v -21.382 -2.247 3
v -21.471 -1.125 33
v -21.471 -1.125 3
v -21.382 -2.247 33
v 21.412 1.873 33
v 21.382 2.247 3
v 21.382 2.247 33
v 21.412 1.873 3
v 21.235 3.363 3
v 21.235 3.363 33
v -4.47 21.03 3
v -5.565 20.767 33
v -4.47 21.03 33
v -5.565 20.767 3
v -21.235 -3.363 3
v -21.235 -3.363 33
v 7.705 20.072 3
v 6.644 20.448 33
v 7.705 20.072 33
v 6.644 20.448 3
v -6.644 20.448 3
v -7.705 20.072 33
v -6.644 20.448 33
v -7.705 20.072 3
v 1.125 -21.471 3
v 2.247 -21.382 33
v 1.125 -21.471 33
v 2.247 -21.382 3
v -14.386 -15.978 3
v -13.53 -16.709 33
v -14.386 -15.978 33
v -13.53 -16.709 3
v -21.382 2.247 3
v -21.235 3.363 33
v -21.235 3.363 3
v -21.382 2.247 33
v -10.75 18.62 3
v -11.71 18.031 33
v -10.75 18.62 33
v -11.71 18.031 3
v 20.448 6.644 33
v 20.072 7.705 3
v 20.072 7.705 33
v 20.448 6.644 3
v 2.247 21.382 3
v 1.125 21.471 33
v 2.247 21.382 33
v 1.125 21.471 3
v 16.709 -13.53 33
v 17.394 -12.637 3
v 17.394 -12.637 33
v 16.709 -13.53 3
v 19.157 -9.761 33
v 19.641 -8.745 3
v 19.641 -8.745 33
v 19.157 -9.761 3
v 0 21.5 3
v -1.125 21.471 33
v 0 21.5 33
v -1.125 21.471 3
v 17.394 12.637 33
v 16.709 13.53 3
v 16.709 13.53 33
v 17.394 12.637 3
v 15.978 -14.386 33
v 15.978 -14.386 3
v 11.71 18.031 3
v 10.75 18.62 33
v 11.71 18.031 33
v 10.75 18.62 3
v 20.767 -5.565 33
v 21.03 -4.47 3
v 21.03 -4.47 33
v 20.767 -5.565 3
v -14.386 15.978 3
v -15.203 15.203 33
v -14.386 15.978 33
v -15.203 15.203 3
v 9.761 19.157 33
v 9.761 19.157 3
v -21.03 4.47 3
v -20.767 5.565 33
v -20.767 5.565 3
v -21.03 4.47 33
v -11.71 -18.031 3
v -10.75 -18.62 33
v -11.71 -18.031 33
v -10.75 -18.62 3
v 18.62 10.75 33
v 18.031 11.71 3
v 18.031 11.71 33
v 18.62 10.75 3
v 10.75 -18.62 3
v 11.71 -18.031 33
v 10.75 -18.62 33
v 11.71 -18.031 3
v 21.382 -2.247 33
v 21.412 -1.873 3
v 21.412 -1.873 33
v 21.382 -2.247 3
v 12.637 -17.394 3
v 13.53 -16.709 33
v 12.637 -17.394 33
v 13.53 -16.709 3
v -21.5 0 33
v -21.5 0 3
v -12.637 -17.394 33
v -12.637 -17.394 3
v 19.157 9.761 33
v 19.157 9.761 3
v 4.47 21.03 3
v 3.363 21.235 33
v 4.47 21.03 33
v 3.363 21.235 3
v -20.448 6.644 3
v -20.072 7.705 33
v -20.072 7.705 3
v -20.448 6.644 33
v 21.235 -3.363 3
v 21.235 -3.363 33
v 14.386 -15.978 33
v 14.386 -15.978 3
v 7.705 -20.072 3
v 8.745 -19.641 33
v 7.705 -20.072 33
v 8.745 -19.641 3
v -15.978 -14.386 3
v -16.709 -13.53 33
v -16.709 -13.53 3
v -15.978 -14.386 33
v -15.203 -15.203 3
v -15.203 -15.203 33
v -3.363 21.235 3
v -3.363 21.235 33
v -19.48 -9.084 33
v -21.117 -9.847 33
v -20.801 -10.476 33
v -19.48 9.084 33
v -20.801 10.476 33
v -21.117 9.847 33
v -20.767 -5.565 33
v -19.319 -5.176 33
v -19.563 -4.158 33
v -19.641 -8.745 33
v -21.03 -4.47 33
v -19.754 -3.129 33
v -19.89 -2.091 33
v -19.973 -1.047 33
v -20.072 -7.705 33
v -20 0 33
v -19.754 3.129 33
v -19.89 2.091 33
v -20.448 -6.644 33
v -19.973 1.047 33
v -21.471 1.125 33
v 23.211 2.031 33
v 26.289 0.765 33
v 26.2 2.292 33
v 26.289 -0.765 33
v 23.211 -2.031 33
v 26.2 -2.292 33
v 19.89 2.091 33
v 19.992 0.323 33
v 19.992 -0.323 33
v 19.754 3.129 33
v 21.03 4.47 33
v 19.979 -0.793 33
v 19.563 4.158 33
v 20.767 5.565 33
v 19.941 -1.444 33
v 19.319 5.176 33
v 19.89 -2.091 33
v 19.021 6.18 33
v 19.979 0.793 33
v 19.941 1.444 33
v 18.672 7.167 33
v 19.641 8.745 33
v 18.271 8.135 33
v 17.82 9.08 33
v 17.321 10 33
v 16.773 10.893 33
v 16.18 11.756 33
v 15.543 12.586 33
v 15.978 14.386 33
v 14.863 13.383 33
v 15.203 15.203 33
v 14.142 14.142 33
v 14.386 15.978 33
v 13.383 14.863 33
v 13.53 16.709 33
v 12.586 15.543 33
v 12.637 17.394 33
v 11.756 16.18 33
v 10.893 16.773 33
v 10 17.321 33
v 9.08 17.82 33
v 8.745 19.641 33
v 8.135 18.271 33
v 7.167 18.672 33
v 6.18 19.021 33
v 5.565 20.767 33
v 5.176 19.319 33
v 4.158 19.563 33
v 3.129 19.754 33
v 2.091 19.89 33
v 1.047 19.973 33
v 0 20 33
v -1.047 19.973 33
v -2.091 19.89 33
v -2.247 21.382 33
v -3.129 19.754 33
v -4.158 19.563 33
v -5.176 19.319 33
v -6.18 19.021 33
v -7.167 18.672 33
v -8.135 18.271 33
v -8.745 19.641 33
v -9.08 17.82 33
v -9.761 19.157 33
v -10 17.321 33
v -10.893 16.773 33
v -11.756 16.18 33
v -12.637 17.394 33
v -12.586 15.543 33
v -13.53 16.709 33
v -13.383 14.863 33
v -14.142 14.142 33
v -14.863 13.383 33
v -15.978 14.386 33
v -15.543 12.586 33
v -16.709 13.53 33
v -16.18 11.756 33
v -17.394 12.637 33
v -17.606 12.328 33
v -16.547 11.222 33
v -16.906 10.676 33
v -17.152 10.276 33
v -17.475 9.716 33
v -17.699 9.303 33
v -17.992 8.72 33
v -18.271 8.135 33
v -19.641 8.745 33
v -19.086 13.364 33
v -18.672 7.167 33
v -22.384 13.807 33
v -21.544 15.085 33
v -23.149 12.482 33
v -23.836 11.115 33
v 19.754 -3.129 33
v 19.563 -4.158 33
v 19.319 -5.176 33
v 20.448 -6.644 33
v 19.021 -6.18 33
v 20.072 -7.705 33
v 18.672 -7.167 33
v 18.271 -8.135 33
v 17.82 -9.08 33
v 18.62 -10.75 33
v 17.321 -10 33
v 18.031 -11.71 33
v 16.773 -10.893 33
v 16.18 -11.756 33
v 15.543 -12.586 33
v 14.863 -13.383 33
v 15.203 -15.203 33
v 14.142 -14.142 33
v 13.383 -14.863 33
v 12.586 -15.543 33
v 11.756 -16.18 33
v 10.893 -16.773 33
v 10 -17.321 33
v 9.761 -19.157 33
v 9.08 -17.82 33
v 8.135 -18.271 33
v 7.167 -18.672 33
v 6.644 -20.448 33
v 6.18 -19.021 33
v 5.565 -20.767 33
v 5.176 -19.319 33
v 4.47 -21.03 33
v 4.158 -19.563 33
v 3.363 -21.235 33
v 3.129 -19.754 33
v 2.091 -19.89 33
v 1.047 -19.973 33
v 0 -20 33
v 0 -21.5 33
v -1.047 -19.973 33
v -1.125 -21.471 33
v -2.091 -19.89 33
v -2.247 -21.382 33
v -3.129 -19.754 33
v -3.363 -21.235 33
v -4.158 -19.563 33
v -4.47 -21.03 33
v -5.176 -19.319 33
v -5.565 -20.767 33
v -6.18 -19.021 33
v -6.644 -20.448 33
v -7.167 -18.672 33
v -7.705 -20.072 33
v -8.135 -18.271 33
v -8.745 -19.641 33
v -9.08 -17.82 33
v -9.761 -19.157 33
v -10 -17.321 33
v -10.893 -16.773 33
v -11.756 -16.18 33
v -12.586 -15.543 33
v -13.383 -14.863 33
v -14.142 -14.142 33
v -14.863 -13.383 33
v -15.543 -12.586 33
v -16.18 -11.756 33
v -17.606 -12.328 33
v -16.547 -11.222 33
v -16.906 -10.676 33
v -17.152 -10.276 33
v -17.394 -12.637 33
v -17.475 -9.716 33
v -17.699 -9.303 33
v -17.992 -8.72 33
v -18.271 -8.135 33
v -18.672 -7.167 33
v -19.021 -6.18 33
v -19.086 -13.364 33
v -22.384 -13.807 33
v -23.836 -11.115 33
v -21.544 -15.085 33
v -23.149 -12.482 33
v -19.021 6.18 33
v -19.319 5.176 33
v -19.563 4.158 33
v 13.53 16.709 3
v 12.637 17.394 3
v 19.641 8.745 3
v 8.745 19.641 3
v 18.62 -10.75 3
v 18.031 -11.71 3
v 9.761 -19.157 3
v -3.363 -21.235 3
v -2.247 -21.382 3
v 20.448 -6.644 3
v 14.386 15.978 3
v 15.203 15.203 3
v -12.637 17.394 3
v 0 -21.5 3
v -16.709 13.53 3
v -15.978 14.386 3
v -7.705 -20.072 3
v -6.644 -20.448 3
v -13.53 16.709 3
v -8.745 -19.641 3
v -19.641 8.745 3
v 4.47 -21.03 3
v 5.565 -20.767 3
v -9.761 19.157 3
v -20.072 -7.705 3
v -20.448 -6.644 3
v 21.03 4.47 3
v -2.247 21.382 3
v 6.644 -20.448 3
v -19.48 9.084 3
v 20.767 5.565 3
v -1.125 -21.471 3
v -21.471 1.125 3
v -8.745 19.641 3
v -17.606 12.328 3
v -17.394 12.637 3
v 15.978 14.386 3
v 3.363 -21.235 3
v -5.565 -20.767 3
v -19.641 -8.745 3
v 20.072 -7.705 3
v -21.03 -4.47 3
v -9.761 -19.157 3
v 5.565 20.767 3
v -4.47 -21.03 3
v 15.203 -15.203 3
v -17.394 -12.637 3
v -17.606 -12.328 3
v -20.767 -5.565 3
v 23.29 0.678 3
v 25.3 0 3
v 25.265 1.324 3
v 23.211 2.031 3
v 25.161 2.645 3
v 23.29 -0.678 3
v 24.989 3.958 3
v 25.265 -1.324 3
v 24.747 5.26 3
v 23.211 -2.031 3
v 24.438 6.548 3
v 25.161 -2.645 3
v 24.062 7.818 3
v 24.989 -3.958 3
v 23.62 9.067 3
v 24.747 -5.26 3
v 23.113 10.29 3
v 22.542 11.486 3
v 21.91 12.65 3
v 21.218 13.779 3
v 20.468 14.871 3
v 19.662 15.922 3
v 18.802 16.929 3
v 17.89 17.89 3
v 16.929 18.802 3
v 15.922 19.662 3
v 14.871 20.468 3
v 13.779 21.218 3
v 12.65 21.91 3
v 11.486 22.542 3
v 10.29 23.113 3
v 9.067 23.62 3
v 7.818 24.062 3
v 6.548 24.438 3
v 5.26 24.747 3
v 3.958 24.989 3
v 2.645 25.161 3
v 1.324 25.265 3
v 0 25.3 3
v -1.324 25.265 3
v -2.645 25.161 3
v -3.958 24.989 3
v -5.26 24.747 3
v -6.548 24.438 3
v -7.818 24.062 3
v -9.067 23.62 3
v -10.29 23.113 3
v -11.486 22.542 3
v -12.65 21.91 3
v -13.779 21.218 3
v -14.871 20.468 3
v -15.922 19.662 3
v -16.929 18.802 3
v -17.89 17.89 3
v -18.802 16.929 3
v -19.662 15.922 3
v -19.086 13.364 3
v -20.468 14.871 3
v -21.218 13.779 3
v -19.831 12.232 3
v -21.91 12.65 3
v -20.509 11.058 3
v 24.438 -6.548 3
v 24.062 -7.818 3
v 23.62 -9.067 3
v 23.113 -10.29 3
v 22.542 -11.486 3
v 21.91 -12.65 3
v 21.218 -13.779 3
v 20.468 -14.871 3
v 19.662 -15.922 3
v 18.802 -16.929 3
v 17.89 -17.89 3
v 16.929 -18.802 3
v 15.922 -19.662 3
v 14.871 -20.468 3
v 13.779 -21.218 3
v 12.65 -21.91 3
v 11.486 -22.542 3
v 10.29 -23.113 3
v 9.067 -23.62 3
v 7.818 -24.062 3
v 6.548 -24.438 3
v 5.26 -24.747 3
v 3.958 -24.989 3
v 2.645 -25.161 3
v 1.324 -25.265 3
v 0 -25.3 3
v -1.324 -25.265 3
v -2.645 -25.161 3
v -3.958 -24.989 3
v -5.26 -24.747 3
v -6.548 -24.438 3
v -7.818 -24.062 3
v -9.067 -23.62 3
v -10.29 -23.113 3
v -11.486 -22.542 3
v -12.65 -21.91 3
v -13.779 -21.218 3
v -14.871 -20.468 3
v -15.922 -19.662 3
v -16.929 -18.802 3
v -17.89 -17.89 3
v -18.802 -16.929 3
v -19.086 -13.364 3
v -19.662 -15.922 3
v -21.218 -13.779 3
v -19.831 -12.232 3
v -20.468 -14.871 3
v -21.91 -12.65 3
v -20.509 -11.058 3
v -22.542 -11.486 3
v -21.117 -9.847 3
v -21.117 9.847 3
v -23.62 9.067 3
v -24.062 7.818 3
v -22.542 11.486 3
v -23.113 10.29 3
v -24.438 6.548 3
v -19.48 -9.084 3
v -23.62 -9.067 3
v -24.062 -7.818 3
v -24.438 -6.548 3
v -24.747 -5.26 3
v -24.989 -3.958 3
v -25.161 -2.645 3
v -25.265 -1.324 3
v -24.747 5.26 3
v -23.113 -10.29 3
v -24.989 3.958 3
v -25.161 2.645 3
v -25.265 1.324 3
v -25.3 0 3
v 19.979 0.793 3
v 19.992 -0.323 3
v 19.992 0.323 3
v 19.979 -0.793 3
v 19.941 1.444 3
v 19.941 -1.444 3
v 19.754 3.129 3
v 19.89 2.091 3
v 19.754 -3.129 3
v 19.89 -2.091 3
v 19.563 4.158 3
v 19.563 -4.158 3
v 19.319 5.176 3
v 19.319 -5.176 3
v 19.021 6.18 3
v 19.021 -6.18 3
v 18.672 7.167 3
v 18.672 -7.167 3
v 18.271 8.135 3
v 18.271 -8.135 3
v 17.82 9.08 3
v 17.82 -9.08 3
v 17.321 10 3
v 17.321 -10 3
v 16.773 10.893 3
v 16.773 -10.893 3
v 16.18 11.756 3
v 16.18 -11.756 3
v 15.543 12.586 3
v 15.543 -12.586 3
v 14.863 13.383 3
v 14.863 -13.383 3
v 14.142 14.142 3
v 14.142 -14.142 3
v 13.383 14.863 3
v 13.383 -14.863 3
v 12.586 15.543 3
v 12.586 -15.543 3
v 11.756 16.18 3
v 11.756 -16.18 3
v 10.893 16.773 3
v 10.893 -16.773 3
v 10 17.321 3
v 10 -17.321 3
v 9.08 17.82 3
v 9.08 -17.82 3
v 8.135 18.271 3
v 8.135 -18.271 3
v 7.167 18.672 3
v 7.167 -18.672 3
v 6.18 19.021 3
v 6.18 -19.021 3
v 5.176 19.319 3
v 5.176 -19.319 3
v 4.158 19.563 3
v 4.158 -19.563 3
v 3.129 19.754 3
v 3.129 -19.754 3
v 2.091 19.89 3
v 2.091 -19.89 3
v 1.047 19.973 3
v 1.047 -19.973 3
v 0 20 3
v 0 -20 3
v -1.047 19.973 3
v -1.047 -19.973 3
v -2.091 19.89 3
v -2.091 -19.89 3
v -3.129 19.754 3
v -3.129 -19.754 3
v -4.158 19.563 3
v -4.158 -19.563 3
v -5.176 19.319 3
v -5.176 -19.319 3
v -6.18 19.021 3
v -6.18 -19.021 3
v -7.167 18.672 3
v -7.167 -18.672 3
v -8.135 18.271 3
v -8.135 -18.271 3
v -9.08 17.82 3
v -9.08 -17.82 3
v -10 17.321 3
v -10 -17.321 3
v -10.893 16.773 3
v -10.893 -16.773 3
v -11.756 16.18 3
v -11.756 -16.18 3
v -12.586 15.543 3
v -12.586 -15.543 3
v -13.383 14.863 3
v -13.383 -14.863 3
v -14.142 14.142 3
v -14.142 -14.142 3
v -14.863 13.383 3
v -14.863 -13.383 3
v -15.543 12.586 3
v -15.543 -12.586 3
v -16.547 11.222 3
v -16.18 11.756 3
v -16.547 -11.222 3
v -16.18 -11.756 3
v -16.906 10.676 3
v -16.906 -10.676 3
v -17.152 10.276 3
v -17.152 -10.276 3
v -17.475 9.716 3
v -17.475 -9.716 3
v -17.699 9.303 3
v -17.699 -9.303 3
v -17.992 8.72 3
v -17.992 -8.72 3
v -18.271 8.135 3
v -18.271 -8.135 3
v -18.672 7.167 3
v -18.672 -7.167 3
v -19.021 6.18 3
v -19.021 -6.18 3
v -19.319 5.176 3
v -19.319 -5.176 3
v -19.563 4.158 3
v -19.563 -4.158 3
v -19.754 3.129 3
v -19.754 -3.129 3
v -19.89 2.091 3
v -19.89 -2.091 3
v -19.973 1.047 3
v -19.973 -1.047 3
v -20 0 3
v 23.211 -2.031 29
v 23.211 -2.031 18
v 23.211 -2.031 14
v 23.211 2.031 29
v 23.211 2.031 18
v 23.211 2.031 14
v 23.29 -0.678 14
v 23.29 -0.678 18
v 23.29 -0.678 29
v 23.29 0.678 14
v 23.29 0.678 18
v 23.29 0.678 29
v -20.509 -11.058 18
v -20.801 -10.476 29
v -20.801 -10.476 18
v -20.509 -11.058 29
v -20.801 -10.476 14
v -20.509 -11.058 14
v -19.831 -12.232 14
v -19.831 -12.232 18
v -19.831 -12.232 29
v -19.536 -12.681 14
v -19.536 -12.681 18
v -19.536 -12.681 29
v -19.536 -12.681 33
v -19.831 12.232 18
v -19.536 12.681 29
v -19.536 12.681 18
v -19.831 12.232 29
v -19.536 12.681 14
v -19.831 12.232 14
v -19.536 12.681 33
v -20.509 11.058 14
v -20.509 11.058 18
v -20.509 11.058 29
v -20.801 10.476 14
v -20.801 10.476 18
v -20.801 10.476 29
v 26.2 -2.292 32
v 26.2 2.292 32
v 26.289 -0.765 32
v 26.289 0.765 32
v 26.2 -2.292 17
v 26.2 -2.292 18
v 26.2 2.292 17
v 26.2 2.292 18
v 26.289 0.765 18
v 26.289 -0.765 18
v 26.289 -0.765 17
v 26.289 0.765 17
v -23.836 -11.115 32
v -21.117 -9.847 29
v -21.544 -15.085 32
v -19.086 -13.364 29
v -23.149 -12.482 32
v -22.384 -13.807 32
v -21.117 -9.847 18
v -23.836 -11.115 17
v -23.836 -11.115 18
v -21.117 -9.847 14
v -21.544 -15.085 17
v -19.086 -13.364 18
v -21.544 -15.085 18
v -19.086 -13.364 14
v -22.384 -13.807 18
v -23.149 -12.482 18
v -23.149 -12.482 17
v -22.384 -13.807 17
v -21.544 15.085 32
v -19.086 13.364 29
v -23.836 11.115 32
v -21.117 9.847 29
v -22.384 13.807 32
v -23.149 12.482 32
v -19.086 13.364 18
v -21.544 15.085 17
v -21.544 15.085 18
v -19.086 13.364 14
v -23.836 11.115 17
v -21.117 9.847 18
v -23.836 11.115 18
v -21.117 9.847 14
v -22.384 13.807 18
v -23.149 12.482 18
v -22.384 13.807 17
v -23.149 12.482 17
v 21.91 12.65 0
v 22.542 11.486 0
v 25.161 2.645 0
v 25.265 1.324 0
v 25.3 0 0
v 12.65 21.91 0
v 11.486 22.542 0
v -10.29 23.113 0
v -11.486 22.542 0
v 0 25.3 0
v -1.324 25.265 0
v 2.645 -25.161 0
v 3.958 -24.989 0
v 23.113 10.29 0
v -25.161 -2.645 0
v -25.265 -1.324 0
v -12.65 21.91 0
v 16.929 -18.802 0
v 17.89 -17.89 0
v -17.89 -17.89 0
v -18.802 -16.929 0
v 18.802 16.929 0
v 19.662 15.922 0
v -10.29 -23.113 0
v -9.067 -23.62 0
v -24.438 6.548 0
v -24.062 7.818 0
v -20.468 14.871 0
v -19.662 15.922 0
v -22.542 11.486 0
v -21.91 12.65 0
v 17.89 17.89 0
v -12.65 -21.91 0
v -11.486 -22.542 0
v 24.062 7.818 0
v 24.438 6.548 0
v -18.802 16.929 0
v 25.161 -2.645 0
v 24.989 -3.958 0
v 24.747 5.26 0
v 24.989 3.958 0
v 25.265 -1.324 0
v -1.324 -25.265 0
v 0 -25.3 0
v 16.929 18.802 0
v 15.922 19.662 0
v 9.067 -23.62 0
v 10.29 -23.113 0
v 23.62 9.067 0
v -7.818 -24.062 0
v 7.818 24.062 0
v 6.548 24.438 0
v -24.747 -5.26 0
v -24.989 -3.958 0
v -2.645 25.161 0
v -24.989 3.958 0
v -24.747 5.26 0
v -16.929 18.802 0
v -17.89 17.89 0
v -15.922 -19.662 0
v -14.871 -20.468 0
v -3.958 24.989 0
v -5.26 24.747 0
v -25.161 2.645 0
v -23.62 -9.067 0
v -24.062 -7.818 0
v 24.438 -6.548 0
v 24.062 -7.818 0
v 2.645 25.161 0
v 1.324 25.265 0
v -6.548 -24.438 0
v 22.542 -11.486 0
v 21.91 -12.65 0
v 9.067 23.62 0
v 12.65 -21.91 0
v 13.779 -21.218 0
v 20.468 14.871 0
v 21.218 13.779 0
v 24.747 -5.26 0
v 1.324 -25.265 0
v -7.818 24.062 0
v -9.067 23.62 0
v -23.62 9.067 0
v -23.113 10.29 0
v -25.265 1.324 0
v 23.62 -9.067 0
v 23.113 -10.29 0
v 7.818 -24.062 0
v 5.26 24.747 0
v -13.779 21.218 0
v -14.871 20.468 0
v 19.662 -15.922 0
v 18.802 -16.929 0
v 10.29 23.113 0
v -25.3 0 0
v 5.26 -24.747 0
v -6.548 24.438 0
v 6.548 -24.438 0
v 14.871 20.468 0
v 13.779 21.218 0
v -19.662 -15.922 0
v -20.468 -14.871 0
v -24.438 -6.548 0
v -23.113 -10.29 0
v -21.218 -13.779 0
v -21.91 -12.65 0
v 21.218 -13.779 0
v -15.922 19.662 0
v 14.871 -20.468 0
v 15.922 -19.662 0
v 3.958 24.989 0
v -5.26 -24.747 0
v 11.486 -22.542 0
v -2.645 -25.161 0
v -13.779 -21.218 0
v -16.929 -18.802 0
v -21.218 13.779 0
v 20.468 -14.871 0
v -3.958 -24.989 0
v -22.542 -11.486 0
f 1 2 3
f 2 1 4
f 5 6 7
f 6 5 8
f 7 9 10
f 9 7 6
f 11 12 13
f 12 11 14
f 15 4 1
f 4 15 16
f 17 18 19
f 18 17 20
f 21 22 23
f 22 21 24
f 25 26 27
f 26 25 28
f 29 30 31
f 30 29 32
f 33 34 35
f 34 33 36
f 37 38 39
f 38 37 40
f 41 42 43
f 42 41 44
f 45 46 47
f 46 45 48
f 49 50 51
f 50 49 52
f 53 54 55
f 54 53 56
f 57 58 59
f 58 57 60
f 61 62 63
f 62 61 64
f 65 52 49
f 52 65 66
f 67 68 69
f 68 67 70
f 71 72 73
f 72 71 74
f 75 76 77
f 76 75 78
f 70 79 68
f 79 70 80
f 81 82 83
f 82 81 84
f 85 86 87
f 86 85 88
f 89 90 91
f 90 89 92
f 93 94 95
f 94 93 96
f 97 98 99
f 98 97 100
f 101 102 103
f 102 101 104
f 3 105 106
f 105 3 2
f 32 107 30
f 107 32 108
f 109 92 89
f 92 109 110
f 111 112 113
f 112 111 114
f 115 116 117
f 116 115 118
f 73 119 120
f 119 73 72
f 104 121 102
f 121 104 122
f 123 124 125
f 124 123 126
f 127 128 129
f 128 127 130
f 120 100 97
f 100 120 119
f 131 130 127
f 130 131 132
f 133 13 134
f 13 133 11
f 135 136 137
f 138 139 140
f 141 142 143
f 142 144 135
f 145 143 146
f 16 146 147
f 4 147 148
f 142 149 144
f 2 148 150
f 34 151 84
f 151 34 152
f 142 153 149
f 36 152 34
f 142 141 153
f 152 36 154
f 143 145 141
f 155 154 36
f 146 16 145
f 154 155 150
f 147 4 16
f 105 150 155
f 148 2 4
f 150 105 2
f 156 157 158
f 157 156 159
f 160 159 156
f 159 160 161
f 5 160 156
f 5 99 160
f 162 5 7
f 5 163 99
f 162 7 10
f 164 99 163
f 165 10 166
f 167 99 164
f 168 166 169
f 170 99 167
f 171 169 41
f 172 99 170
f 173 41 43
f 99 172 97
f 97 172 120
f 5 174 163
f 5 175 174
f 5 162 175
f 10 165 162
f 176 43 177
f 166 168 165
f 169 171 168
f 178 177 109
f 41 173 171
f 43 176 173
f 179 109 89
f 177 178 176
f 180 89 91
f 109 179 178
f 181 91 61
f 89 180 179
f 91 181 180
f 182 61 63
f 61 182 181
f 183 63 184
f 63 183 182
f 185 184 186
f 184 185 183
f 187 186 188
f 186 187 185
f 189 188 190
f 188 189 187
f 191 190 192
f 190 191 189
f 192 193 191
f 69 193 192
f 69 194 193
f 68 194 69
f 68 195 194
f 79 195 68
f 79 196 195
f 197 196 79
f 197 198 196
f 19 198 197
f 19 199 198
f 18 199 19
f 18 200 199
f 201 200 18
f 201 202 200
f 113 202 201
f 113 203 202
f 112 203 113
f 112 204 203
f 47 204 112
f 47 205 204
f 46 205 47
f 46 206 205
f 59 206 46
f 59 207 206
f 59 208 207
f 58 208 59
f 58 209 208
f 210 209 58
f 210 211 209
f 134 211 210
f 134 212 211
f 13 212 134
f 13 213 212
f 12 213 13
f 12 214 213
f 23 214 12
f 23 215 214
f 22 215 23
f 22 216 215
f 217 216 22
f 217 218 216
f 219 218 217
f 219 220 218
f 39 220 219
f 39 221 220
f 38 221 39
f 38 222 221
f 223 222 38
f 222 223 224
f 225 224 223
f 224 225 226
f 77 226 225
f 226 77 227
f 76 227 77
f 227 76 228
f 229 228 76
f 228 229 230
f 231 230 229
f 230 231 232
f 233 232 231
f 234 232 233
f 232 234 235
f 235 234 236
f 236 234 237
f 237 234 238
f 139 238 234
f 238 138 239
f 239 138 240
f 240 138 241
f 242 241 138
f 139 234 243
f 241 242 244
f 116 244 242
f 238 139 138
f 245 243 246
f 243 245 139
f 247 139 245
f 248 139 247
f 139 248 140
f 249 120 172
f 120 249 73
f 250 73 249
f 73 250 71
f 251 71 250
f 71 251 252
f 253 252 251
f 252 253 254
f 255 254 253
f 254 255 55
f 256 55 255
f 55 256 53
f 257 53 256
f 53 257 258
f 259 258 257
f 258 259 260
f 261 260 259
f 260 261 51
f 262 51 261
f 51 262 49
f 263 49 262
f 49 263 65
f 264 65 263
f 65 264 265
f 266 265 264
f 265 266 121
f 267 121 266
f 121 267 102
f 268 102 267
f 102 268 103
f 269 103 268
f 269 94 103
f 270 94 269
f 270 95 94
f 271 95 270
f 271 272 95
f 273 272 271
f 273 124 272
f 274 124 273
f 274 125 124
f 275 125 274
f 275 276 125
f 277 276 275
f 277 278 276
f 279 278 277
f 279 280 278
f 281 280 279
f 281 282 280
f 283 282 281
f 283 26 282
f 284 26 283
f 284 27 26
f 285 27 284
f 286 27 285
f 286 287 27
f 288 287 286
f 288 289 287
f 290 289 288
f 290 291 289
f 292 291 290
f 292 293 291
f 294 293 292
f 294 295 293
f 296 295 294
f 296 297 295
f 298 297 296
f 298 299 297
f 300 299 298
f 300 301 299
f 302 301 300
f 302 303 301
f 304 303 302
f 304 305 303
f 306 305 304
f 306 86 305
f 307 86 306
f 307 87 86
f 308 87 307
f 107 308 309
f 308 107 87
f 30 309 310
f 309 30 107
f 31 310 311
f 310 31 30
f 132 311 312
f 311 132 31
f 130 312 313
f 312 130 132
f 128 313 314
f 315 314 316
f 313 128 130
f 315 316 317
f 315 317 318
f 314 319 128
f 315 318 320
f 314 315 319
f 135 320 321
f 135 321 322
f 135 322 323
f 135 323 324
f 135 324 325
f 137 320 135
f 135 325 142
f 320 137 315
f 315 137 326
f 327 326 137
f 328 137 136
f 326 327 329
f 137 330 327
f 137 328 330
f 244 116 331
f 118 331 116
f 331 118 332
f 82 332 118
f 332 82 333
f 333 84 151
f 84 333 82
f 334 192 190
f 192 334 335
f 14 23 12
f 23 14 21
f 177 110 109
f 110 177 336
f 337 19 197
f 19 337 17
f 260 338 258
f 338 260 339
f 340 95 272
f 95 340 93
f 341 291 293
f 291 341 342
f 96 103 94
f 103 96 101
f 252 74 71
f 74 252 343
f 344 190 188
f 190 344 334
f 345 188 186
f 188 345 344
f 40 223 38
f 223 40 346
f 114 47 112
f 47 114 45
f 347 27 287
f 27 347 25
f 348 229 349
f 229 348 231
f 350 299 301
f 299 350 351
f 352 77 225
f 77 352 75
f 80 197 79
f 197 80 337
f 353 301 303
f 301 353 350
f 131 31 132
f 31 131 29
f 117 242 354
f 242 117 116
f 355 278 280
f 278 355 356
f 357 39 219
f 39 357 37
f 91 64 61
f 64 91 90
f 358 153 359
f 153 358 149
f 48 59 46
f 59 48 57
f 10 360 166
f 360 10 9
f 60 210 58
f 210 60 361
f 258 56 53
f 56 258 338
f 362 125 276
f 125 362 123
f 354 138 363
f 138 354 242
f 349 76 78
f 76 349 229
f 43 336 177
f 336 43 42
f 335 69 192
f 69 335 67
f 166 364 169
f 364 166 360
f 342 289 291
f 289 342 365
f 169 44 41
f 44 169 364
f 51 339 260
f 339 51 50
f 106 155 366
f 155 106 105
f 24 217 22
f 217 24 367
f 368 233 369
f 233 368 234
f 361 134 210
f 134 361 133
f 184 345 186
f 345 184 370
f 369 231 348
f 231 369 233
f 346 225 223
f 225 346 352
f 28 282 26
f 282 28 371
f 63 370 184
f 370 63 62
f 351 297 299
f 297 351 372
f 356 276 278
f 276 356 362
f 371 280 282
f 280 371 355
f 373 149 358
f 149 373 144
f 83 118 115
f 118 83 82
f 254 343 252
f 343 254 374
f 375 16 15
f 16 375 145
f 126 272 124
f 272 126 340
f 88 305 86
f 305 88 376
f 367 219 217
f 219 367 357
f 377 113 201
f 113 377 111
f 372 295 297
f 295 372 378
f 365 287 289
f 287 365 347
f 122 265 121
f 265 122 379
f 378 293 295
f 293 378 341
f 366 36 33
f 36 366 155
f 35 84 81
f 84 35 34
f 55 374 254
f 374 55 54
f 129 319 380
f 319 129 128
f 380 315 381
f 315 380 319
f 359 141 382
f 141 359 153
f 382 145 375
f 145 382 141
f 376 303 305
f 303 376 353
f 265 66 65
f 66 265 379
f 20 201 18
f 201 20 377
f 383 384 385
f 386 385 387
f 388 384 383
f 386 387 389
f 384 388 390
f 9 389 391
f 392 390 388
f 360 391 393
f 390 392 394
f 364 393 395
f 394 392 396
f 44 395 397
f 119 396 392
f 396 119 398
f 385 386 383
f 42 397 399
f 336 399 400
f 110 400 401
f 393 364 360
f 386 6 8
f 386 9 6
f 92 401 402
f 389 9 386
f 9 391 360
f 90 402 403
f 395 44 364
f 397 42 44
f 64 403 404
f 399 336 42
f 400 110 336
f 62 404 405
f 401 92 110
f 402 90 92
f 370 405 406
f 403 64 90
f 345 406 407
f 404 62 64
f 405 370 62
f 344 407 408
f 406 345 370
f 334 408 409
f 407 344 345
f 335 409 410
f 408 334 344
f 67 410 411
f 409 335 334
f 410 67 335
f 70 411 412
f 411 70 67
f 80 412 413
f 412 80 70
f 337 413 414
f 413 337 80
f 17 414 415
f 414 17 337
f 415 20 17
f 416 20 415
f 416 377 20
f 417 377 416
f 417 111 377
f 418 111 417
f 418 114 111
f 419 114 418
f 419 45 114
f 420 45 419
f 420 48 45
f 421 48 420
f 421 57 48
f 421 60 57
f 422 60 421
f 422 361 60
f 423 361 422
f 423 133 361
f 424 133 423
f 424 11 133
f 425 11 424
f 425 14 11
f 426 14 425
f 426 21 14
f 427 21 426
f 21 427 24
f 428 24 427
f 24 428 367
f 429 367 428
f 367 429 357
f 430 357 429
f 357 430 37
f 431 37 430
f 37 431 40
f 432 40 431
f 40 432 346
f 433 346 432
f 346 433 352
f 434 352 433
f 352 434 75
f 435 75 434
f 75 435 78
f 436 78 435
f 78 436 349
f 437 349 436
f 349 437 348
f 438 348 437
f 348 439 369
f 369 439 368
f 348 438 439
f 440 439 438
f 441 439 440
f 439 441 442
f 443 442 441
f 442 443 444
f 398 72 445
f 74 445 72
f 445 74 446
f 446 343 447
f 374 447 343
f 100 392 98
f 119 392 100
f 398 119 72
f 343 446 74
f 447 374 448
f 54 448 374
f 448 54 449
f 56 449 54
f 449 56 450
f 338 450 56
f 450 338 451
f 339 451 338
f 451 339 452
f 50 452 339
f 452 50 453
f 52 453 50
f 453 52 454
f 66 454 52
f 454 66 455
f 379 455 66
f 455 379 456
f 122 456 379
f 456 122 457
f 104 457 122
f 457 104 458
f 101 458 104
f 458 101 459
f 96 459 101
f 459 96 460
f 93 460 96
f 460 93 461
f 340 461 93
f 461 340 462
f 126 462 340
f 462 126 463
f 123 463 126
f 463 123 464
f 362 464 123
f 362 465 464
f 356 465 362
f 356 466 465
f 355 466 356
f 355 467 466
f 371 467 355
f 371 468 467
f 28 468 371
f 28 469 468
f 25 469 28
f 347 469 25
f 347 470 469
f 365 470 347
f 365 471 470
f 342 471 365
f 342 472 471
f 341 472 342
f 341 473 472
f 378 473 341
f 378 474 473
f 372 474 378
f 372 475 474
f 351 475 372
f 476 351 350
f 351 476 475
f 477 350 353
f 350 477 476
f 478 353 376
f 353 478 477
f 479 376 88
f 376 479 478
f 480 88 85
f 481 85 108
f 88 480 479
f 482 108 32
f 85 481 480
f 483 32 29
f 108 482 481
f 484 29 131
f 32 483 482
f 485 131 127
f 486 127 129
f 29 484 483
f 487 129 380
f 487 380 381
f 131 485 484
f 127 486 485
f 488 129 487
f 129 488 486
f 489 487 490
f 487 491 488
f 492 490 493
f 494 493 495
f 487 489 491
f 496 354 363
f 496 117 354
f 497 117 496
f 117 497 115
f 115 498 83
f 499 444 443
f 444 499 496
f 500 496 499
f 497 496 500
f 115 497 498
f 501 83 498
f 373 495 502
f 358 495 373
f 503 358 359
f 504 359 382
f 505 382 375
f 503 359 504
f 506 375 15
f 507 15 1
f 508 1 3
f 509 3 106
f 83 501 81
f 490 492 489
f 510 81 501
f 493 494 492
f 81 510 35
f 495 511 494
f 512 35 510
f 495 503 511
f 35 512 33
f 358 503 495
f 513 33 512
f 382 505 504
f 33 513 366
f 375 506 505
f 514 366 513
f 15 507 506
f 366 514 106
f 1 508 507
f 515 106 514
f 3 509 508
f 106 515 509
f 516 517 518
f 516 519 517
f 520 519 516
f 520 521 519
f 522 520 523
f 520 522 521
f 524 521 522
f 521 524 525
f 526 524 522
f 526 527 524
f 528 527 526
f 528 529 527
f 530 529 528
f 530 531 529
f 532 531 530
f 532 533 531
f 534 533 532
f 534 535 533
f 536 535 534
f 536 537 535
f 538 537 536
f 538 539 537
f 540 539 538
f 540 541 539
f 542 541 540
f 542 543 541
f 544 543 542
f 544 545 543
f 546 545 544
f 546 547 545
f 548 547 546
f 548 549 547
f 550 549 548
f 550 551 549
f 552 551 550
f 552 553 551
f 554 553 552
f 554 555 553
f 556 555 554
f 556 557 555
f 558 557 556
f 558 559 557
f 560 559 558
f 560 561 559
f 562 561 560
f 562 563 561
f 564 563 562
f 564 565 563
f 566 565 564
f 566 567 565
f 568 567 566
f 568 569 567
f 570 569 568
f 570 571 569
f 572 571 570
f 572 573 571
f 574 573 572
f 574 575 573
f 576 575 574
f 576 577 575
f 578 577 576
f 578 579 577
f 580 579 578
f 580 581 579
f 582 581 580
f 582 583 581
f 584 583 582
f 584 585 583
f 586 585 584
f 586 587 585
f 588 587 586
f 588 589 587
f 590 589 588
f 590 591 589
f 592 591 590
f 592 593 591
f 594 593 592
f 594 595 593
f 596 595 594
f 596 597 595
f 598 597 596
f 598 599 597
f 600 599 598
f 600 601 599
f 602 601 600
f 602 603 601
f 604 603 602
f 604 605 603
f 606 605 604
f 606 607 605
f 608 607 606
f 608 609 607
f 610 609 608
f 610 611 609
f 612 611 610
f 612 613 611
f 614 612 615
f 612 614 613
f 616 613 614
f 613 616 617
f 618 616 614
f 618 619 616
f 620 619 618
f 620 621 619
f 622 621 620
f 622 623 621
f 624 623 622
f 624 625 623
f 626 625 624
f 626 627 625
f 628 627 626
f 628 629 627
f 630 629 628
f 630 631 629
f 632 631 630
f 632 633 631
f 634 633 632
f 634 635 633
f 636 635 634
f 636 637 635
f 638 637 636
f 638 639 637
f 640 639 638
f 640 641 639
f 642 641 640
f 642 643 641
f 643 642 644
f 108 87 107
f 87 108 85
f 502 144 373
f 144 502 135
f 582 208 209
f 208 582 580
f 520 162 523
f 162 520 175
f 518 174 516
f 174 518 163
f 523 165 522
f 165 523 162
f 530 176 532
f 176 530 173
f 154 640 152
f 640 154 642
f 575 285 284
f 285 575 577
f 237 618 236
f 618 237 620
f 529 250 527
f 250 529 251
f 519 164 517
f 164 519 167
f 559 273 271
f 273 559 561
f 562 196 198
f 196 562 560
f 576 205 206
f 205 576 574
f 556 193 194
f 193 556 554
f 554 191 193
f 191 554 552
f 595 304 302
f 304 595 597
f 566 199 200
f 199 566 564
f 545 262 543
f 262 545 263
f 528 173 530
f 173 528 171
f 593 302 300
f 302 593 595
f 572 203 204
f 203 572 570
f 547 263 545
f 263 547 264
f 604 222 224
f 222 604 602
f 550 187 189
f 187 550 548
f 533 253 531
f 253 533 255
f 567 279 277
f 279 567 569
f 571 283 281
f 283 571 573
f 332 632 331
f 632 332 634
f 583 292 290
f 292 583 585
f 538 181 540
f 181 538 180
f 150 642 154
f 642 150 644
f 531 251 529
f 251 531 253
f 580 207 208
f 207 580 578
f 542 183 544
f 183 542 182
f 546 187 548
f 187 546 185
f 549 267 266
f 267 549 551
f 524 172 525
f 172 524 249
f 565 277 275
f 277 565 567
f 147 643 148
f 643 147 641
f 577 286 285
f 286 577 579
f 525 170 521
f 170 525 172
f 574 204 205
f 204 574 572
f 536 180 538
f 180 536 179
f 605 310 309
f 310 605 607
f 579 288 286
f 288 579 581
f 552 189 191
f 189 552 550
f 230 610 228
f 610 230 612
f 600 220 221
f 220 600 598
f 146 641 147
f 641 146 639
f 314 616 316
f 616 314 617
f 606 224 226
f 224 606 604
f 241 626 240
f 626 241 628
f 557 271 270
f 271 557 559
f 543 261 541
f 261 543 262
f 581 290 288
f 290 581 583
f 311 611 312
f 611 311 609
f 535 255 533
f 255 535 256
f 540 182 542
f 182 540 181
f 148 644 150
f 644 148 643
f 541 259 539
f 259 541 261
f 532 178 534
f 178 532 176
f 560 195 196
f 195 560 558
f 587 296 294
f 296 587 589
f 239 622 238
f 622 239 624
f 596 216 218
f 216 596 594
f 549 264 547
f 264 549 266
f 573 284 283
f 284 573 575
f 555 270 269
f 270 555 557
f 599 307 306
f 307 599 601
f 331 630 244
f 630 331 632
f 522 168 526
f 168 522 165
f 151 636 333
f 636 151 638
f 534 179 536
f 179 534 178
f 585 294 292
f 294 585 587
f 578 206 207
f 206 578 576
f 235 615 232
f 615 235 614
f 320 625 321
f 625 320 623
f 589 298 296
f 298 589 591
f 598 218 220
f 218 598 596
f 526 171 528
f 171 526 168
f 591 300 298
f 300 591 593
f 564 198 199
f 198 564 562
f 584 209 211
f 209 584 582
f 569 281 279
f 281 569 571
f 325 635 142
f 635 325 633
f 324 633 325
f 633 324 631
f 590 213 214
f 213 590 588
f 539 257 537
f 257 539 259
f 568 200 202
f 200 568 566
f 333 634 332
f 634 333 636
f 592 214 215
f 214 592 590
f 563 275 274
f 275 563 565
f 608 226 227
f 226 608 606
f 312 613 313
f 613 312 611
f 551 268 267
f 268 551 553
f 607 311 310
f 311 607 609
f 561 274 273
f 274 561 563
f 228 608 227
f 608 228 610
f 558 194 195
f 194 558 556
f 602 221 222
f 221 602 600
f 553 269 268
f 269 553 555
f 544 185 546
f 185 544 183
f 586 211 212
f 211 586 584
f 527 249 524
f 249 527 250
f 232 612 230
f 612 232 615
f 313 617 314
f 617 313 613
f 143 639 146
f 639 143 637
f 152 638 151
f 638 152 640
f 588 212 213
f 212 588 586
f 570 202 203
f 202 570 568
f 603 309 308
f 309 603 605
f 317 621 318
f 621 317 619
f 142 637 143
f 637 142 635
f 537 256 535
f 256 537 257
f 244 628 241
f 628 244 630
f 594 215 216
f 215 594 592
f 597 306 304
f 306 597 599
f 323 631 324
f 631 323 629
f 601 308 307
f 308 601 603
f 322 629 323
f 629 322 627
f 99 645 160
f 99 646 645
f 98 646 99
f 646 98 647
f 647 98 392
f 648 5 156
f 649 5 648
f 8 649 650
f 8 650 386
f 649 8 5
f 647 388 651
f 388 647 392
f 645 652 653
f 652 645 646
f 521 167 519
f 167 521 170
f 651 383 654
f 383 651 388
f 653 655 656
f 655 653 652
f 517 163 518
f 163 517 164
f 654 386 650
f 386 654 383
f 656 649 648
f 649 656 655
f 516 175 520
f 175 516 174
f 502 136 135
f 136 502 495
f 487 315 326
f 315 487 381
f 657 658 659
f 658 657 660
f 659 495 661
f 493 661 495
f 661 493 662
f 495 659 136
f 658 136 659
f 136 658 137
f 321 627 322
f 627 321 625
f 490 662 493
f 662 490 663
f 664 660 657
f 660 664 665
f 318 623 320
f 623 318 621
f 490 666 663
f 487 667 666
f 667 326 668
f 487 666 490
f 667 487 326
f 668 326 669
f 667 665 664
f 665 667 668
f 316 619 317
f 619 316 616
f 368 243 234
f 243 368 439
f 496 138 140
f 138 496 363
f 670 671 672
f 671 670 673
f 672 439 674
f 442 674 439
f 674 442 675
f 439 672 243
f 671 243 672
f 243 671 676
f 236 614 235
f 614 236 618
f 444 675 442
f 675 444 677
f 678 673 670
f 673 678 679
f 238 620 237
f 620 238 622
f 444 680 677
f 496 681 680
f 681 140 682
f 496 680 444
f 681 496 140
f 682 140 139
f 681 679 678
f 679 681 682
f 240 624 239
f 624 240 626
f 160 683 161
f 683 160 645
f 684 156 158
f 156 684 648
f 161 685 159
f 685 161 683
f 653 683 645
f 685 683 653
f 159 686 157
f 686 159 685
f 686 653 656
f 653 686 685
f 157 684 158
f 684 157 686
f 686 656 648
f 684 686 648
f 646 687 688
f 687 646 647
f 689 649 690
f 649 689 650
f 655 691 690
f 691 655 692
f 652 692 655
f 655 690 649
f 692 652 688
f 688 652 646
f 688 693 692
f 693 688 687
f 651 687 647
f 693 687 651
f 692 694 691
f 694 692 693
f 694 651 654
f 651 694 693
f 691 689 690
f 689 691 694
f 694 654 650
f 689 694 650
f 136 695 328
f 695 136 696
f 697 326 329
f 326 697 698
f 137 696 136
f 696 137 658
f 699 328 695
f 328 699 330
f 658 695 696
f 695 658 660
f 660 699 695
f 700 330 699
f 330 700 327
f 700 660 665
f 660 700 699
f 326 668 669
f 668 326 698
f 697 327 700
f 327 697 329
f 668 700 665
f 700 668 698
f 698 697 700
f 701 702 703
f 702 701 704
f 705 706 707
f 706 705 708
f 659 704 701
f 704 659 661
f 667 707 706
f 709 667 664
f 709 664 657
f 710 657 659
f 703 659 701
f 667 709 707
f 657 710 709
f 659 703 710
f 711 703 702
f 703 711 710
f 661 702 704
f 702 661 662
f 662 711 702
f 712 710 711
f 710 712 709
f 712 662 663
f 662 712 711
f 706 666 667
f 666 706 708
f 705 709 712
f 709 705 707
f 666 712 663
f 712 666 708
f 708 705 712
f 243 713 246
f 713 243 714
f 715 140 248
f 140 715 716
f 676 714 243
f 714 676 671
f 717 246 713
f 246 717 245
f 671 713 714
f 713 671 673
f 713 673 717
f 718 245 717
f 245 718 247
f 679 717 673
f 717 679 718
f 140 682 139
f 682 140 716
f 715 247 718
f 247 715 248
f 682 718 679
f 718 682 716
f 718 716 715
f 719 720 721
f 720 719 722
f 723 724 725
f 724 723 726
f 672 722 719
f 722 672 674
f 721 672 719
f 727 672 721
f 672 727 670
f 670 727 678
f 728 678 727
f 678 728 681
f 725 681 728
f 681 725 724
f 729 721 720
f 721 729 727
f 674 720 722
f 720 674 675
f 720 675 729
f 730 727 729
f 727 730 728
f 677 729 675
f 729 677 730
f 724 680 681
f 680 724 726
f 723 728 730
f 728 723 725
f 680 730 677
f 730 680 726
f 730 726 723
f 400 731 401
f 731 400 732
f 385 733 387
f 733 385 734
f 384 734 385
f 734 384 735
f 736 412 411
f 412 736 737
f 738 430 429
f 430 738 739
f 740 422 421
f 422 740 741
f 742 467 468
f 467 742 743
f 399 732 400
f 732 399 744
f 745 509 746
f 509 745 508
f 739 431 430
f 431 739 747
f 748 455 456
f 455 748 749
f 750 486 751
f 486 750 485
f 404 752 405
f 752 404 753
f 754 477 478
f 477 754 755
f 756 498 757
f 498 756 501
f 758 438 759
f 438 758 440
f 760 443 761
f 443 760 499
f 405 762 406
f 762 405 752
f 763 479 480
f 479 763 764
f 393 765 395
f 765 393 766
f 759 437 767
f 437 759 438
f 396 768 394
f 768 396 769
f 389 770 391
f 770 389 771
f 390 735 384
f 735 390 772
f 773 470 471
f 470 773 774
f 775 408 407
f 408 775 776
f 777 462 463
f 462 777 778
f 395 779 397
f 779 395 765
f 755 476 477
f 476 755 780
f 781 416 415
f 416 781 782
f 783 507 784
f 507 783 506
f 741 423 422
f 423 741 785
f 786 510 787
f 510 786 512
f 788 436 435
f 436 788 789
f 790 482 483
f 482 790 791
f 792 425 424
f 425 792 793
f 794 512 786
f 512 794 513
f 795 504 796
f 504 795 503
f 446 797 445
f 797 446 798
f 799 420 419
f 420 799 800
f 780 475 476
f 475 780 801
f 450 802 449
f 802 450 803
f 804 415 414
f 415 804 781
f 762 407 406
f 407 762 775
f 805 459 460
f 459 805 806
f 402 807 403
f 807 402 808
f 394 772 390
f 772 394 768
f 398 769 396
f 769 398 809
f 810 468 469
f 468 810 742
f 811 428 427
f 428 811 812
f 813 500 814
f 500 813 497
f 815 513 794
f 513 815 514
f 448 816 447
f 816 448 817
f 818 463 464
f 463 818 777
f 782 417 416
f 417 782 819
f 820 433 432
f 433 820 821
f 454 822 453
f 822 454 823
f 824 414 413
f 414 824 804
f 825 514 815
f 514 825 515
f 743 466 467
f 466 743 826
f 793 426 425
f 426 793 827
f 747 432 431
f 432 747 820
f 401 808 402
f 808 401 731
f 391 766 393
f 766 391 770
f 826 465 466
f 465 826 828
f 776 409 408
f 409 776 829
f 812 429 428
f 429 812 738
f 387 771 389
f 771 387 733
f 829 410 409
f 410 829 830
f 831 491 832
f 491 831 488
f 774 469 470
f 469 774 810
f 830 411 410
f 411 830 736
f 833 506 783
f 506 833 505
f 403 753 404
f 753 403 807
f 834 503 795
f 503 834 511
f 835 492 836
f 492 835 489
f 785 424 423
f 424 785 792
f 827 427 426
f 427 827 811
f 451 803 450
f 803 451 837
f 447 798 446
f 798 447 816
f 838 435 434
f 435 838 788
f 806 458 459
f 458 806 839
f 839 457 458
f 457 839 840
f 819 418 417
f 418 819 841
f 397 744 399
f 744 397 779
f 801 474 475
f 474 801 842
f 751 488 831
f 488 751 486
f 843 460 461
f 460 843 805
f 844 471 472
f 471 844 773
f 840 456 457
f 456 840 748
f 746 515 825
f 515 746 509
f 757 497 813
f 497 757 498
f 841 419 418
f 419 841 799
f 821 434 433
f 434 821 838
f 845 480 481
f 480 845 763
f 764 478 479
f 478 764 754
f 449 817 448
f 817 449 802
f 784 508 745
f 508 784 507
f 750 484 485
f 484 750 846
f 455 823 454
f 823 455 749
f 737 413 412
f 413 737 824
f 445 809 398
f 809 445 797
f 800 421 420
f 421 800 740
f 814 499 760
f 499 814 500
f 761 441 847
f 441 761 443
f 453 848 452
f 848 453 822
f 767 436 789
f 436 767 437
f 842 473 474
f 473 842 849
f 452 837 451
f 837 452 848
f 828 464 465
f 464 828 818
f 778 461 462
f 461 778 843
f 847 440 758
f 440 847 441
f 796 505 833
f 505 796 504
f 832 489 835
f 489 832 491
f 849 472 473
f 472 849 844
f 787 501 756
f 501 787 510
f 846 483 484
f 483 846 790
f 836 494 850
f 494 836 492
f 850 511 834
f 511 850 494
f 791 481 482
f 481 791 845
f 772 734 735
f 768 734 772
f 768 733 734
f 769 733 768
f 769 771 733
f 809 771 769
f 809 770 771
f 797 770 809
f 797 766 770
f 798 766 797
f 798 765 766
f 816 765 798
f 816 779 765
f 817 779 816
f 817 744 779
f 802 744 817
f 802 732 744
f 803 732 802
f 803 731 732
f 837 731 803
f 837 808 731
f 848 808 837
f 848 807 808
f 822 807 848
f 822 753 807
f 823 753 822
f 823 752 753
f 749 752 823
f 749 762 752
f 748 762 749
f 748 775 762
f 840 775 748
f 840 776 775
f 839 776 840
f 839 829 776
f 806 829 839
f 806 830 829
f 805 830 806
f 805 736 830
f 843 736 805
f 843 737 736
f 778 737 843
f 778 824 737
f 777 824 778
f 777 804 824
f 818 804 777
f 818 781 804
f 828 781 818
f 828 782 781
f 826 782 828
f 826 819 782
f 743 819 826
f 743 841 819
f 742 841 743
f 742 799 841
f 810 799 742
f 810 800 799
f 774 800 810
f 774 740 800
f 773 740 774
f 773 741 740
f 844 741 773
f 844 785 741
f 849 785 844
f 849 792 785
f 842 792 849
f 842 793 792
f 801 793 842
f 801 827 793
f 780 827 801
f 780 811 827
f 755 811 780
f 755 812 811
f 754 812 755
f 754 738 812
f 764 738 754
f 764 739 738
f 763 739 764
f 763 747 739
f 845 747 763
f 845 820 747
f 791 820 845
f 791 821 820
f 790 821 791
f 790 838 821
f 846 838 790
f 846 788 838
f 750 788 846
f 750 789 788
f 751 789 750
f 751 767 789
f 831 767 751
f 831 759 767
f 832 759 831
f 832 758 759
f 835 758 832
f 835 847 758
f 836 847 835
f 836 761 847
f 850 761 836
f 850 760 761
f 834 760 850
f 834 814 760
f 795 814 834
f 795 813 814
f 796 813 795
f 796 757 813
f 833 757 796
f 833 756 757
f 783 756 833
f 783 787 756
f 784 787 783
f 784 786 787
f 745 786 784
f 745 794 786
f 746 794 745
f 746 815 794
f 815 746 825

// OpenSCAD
// file: rotate_extrude.scad
// From http://forum.openscad.org/rotate-extrude-angle-always-360-td19035.html

module rotate_extrude2(angle=360, convexity=2, size=1000) {

  module angle_cut(angle=90,size=1000) {
    x = size*cos(angle/2);
    y = size*sin(angle/2);
    translate([0,0,-size]) 
      linear_extrude(2*size) polygon([[0,0],[x,y],[x,size],[-size,size],[-size,-size],[x,-size],[x,-y]]);
  }

  // support for angle parameter in rotate_extrude was added after release 2015.03 
  // Thingiverse customizer is still on 2015.03
  angleSupport = (version_num() > 20150399) ? true : false; // Next openscad releases after 2015.03.xx will have support angle parameter
  // Using angle parameter when possible provides huge speed boost, avoids a difference operation

  if (angleSupport) {
    rotate_extrude(angle=angle,convexity=convexity)
      children();
  } else {
    rotate([0,0,angle/2]) difference() {
      rotate_extrude(convexity=convexity) children();
      angle_cut(angle, size);
    }
  }
}
// file: sharedparams.scad
// Main parameters
compartmentDiameter = 40;
compartmentHeight = 30;
numRings = 2;
positionLabels = [
    "A", "B", "C", "D", "E", "F", "G", "H", "I", "J",
    "K", "L", "M", "N", "O", "P", "Q", "R", "S", "T",
    "U", "V", "W", "X", "Y", "Z"
];

// Inner shell
isInnerRadius = compartmentDiameter / 2;
isThick = 1.5;
isOuterRadius = isInnerRadius + isThick;
isInnerHeight = compartmentHeight;
isBaseThick = 3;
isOuterHeight = isInnerHeight + isBaseThick;
isProngSpanAngle = 10; // angular width of the lock prongs

// Outer shell
isOsClearance = 0.3; // Clearance on radius
osInnerRadius = isOuterRadius + isOsClearance;
osThick = 1.5;
osOuterRadius = osInnerRadius + osThick;
osInnerHeight = isInnerHeight;
osBaseThick = isBaseThick;
osOuterHeight = osInnerHeight + osBaseThick;
osBaseOverhang = 2;
osBaseRadius = osOuterRadius + osBaseOverhang;

// Rings
ringSpacing = compartmentHeight / numRings;
osRingClearance = 0.3;
osProngProtrusion = 3; // Amount lock prongs protrude from the OD of the outer shell
isProngProtrusion = isOsClearance + osThick + osProngProtrusion; // amount the lock prongs extend from the OD of the inner shell cylinder
prongHeight = osProngProtrusion + 1; // total height of lock prongs, at the OD of the outer shell


// Misc
latchAngles = [ 0, 180+30, 180-30 ];

// System
$fa = 3;
$fs = 0.5;
// main file
include <sharedparams.scad>
include <rotate_extrude.scad>

module InnerShell() {
    translate([0, 0, isBaseThick])
        difference() {
            // Main cylinder
            cylinder(h=isInnerHeight, r=isOuterRadius);
            // Inner cutout
            cylinder(h=isInnerHeight, r=isInnerRadius);
        };
    // Base/cap
    cylinder(h=isBaseThick, r=osBaseRadius);
        
    // Side ridges
    sideRidgeProtrusion = isOsClearance + osThick; // how far the ridges protrude from the outer edge of the main cylinder
    module sideRidge() {
        rotate([0, 0, -isProngSpanAngle/2])
            rotate_extrude2(angle=isProngSpanAngle)
                translate([isInnerRadius, 0])
                    square([isOsClearance + osThick + isThick, isInnerHeight]);
    };
    for (ang = latchAngles)
        rotate([0, 0, ang])
            translate([0, 0, isBaseThick])
                sideRidge();
    
        
    // Side prongs
    module prong() {
        // module produces a single prong, at the correct X offset, centered on the X axis, with a bottom Z of 0
        protrusion = isProngProtrusion - sideRidgeProtrusion;
        height = prongHeight;
        angle = isProngSpanAngle;
        rotate([0, 0, -angle/2])
            rotate_extrude2(angle=angle)
                translate([isOuterRadius + sideRidgeProtrusion, 0])
                    polygon([
                        [0, 0],
                        [protrusion, protrusion],
                        [protrusion, height],
                        [0, height]
                    ]);
    };
    for (ang = latchAngles)
        rotate([0, 0, ang])
            for (z = [isInnerHeight + isBaseThick - prongHeight : -ringSpacing : isBaseThick])
                translate([0, 0, z])
                    prong();
};

InnerShell();
